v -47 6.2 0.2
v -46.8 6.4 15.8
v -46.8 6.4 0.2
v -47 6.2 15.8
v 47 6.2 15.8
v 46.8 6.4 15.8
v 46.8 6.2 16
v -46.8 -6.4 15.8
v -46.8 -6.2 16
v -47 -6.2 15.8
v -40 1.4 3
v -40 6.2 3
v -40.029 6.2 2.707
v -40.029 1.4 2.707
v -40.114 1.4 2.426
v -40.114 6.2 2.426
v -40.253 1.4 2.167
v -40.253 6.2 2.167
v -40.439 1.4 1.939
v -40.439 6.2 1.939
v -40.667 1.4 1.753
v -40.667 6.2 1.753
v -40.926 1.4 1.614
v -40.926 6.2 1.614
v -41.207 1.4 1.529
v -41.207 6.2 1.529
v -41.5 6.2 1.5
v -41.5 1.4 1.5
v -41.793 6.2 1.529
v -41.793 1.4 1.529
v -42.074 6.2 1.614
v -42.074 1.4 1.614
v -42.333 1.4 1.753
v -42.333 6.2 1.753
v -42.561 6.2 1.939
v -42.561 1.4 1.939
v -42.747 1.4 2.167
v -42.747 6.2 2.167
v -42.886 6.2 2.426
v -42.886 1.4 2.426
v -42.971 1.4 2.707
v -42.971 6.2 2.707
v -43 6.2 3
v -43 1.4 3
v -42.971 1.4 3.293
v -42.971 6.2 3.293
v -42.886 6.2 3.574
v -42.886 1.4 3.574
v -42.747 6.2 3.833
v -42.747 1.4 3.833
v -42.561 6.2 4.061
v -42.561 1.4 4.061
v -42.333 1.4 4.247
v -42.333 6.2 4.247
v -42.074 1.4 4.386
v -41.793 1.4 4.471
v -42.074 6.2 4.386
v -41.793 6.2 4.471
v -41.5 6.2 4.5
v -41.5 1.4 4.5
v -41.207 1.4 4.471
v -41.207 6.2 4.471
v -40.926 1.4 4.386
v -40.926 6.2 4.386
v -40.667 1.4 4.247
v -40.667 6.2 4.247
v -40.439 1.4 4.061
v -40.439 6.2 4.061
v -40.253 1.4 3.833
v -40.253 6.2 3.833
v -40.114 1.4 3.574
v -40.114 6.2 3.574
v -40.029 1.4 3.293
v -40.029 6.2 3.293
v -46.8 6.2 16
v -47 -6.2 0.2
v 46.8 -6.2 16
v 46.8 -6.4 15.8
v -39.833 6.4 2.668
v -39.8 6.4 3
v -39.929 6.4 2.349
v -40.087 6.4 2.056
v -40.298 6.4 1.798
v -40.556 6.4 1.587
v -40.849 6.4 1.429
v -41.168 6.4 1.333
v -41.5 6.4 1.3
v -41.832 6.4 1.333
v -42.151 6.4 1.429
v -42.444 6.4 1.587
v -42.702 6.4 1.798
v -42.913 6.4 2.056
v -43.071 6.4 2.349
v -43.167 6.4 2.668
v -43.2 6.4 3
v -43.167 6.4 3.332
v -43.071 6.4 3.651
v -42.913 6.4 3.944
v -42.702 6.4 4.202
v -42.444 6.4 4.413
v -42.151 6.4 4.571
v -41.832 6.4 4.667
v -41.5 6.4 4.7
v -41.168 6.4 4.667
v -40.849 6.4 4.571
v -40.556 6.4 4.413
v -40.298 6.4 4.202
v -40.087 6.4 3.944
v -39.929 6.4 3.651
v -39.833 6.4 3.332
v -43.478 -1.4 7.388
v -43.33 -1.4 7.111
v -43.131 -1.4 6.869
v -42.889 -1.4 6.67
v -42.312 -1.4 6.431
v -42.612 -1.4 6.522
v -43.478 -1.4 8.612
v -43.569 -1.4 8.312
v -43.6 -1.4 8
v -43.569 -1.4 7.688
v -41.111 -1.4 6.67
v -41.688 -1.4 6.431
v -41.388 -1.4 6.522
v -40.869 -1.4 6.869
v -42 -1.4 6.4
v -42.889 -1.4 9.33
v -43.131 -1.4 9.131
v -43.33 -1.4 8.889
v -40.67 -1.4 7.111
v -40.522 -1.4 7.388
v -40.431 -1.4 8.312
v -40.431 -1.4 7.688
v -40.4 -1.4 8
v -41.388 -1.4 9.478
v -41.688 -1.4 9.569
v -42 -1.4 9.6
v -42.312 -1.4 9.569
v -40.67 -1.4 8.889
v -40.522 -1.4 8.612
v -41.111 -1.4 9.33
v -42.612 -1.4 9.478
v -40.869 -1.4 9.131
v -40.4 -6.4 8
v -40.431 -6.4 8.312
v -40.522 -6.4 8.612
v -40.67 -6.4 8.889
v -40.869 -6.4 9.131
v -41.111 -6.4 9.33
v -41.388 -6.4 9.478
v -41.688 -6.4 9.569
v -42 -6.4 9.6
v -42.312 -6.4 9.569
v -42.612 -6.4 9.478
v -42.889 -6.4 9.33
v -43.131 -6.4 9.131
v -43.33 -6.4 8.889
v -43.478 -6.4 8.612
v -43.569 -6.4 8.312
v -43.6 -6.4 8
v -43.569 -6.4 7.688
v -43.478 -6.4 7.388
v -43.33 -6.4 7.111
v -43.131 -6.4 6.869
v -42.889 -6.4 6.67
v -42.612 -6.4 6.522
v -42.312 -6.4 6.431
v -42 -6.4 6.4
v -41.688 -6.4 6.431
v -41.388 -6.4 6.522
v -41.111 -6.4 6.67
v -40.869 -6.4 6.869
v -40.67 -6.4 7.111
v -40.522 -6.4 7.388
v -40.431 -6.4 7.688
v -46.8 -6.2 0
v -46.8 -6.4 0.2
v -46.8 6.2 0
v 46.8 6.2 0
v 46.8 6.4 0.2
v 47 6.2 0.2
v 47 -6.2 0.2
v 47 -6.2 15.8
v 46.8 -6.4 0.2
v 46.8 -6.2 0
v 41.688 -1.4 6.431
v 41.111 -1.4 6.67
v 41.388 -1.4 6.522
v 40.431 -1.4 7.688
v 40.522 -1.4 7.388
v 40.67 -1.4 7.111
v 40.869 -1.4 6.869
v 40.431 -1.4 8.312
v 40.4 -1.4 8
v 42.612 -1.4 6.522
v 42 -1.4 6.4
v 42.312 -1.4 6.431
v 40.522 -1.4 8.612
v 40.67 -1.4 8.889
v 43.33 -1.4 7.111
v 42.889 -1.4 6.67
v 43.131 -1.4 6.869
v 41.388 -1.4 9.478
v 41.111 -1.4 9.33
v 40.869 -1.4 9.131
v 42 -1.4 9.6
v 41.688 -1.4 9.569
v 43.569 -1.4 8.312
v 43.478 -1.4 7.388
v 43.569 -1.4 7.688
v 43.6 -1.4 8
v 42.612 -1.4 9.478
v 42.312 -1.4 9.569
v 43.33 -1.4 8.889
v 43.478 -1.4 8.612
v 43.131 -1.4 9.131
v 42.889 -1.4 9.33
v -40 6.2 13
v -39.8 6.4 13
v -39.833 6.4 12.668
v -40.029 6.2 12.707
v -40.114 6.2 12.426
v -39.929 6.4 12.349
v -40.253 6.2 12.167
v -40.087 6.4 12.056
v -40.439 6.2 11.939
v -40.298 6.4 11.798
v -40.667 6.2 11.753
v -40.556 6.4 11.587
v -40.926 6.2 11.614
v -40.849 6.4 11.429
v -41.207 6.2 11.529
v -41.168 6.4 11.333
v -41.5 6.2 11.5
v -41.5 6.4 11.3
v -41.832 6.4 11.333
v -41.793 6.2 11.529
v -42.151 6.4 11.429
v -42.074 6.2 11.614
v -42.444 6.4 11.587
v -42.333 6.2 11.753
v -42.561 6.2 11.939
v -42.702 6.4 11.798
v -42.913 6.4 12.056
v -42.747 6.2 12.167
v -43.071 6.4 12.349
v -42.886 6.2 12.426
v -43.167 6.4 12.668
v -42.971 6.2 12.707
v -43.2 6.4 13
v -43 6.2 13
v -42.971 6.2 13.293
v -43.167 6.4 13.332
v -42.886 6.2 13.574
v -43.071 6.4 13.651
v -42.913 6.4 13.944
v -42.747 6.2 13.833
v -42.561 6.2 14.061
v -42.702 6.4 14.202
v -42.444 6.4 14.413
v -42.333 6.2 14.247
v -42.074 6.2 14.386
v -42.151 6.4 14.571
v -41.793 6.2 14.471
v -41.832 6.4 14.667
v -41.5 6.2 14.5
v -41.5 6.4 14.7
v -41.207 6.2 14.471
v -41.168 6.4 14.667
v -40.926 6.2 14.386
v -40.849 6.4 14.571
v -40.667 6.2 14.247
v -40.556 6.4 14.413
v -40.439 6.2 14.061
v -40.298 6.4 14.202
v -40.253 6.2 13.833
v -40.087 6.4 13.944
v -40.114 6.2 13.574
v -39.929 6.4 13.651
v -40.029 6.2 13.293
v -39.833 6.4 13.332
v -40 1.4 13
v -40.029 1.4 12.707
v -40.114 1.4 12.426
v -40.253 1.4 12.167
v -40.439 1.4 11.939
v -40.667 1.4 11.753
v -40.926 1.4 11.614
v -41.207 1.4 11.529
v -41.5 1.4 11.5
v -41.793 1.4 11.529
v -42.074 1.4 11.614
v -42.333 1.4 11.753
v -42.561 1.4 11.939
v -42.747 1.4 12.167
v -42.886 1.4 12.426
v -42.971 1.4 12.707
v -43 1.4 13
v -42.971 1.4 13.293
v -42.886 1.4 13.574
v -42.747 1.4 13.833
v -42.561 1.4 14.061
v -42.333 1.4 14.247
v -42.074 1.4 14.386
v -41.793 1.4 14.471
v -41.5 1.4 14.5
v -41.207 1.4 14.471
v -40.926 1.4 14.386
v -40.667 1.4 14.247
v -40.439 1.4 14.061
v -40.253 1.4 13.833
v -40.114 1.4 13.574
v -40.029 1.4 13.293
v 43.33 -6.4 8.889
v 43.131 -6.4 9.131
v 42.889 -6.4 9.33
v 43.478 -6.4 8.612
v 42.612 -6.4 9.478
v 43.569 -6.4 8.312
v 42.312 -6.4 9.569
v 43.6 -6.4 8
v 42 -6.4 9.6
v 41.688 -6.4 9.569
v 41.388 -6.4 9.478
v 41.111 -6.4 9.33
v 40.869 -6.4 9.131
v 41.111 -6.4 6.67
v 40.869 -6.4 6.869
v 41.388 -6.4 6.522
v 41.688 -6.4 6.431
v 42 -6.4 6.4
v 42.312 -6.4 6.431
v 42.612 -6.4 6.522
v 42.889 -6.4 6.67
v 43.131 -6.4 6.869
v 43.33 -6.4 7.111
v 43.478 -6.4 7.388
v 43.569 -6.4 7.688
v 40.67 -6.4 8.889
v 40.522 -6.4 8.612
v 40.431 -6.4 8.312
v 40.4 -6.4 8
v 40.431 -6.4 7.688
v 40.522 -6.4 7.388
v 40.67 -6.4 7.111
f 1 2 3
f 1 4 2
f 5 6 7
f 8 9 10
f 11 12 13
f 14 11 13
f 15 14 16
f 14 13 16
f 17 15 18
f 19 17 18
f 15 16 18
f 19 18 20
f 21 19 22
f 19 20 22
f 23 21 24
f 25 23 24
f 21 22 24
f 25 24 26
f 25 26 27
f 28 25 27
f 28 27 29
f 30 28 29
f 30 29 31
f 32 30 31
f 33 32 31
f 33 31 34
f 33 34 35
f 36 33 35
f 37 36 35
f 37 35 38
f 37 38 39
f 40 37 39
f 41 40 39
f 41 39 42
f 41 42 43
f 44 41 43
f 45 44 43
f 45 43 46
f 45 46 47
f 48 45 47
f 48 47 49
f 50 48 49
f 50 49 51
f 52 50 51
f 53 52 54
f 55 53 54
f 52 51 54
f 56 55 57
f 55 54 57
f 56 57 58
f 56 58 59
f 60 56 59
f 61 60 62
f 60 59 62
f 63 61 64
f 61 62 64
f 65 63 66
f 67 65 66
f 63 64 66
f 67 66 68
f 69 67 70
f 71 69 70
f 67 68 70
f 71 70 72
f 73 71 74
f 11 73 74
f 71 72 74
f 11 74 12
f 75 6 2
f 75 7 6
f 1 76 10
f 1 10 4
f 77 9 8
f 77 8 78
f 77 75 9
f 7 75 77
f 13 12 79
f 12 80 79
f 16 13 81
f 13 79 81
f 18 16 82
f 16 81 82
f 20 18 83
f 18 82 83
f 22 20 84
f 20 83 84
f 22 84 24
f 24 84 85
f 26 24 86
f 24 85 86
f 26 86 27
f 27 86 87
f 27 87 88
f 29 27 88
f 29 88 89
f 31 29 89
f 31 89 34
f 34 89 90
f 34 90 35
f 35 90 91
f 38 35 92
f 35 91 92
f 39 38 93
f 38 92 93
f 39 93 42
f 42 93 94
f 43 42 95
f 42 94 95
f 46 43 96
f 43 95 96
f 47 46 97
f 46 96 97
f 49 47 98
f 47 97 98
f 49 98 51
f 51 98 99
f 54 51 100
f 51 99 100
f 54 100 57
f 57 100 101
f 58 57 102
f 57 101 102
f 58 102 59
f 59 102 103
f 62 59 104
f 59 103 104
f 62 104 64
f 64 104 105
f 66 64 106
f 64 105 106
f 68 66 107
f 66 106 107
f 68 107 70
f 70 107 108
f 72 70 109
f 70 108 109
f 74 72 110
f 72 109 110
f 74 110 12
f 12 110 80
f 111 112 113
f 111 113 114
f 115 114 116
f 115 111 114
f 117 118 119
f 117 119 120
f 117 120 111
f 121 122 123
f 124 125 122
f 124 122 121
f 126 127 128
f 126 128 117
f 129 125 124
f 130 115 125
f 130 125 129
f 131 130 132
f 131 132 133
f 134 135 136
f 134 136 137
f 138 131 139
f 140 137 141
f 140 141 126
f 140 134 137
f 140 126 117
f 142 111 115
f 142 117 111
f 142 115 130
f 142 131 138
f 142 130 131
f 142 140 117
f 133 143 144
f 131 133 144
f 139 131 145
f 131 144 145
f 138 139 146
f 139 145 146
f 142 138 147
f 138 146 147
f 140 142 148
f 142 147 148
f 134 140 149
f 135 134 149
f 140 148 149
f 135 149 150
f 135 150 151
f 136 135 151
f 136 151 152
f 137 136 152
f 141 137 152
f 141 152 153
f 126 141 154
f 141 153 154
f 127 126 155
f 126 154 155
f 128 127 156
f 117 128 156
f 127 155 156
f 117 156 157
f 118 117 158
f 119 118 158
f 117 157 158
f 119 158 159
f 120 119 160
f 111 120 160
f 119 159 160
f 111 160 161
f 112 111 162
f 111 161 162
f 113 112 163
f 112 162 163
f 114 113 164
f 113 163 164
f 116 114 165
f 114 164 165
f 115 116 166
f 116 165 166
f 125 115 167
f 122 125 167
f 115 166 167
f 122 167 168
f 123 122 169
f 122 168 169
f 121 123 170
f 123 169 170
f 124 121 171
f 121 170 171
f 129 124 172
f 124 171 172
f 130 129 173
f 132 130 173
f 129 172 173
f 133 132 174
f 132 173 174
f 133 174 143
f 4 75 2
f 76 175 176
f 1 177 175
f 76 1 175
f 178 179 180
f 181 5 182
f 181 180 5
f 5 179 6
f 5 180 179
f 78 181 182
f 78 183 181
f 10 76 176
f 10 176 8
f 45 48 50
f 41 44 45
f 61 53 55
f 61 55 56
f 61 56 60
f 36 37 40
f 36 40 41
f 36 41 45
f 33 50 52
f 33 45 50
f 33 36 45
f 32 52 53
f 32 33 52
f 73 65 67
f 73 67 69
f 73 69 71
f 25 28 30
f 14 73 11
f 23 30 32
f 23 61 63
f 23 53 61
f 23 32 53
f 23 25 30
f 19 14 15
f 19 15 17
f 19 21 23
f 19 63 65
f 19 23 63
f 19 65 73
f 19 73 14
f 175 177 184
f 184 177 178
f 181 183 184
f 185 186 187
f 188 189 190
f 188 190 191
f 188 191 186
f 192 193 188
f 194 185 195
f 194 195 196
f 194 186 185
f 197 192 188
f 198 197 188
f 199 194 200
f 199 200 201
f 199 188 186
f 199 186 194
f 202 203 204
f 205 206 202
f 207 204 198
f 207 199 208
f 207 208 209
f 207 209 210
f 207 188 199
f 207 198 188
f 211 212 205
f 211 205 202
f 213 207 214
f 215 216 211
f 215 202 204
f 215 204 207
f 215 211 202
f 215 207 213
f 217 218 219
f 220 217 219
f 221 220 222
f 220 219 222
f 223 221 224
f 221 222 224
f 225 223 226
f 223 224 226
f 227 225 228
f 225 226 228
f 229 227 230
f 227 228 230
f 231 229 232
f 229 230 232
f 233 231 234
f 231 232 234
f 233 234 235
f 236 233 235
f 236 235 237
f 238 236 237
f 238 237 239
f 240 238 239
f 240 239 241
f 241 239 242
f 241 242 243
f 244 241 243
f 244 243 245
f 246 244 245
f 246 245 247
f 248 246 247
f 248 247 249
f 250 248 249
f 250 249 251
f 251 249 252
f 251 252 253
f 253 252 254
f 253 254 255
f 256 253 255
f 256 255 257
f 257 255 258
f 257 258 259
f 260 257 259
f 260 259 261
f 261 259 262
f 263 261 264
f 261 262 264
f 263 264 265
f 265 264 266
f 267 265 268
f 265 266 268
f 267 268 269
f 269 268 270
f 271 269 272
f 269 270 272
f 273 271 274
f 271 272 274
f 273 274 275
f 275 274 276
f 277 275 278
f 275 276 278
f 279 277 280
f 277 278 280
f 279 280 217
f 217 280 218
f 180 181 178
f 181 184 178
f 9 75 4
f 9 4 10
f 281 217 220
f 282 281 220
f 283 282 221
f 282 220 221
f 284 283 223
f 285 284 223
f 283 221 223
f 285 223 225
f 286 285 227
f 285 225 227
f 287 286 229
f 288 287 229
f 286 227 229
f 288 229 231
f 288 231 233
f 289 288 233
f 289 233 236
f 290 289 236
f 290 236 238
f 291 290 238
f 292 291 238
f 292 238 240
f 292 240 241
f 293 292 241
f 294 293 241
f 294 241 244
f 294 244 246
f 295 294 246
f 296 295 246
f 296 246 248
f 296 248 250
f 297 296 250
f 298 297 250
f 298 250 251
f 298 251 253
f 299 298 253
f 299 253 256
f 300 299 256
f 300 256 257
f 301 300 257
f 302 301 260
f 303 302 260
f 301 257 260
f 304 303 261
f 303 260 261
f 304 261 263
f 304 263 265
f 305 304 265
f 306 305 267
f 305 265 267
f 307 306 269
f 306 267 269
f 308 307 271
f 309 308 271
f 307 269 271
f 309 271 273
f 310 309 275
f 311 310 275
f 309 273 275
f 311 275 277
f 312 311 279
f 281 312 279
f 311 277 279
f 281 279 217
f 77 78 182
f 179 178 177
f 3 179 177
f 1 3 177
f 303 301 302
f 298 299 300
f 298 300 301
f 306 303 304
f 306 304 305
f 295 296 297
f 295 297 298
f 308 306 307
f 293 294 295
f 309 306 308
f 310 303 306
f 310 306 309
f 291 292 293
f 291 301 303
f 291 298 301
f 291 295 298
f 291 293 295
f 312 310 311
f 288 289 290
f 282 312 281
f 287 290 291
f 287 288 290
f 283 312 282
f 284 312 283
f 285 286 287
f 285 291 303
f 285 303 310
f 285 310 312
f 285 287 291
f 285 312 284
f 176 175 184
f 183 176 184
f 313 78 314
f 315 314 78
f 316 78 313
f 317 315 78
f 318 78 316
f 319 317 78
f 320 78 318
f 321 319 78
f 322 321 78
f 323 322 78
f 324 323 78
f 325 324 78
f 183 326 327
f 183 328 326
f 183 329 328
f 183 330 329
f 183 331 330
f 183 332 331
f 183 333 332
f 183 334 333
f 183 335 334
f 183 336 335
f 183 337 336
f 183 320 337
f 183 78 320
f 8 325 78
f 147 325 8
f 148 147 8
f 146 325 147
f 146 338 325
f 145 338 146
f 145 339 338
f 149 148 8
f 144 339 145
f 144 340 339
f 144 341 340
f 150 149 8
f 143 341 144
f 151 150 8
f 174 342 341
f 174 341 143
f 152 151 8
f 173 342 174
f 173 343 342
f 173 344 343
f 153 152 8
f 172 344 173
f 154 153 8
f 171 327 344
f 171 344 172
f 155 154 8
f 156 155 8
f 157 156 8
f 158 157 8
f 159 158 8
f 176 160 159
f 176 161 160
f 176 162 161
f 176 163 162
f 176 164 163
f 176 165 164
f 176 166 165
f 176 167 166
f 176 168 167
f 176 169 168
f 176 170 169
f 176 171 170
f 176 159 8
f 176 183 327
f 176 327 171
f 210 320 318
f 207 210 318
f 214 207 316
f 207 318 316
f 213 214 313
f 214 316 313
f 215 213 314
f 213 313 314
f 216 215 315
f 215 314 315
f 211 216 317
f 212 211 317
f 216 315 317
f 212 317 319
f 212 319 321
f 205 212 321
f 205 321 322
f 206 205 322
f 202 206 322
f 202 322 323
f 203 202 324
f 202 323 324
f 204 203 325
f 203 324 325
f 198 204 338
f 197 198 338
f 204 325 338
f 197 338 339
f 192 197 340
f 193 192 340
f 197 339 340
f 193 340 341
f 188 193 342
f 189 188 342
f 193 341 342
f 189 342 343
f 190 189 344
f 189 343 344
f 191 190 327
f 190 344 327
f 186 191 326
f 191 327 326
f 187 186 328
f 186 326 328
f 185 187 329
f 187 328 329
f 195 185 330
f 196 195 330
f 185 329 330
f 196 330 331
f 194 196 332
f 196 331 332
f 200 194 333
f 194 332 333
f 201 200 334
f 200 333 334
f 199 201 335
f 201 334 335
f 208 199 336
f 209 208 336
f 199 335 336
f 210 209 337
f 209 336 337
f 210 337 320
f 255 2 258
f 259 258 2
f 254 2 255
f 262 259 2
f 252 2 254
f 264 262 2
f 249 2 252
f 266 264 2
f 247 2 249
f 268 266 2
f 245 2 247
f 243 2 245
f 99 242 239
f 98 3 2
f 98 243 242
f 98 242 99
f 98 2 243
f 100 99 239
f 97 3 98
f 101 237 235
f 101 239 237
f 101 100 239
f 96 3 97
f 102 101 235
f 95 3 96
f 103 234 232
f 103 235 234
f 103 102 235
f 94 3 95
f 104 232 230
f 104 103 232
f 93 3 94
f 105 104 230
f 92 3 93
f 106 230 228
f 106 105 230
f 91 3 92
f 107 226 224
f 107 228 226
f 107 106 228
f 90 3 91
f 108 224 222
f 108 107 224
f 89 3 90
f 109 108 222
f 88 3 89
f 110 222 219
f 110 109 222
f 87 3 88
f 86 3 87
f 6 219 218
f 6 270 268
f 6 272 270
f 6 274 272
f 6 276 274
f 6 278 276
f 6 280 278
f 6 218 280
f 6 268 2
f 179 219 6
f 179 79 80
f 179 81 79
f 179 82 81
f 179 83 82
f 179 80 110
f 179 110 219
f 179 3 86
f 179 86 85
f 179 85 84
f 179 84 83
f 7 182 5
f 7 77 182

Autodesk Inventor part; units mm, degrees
ref_plane "YZ Plane" through (0, 0, 0) normal (1, 0, 0) x (0, 1, 0)
ref_plane "XZ Plane" through (0, 0, 0) normal (0, 1, 0) x (-1, 0, 0)
ref_plane "XY Plane" through (0, 0, 0) normal (0, 0, 1) x (1, 0, 0)
sketch "Sketch1" plane through (0, 0, 0) normal (0, 0, 1) x (1, 0, 0)
  line L0 (-47, 6.4) -> (47, 6.4)
  line L1 (47, 6.4) -> (47, -6.4)
  line L2 (47, -6.4) -> (-47, -6.4)
  line L3 (-47, -6.4) -> (-47, 6.4)
  point P0 (0, 0)
  point P1 (-47, 0)
  point P2 (0, 6.4)
  dimension "d0" = 94
  dimension "d1" = 12.8
extrude "Extrusion1" add sketch "Sketch1" along normal blind 16
chamfer "Chamfer1" distance 0.2 angle 45 12 edges at (0, 6.4, 16) (-47, 0, 16) (-47, 6.4, 8) (0, 6.4, 0) (0, -6.4, 16) (0, -6.4, 0) (47, -6.4, 8) (47, 6.4, 8) (47, 0, 16) (47, 0, 0) (-47, 0, 0) (-47, -6.4, 8)
sketch "Sketch2" plane through (-46.8, 6.4, 0.2) normal (0, 1, 0) x (1, 0, 0)
  circle A0 centre (5.3, -2.8) radius 1.5
  circle A1 centre (5.3, -12.8) radius 1.5
  line L0 (0, -15.8) -> (93.6, -15.8) projected
  line L1 (93.6, 0.2) -> (0, 0.2) projected
  line L2 (-0.2, 0) -> (-0.2, -15.6) projected
  line L3 (7.8, 0.2) -> (7.8, -15.8)
  point P0 (46.8, 0.2)
  dimension "d7" = 3
  dimension "d8" = 10
  dimension "d9" = 16
  dimension "d10" = 3
  dimension "d11" = 5.5
  dimension "d12" = 8
extrude "Extrusion2" cut sketch "Sketch2" against normal blind 5
thread "Thread1" size "M3x0.5" class "6H" standard "ANSI Metric M Profile" full length
thread "Thread2" size "M3x0.5" class "6H" standard "ANSI Metric M Profile" full length
chamfer "Chamfer2" distance 0.2 angle 45 2 edges at (-43, 6.4, 13) (-43, 6.4, 3)
sketch "Sketch3" plane through (-46.8, -6.4, 15.8) normal (0, -1, 0) x (1, 0, 0)
  circle A0 centre (4.8, -7.8) radius 1.6
  circle A1 centre (88.8, -7.8) radius 1.6
  line L0 (0, -15.6) -> (0, 0) projected
  line L1 (93.6, 0) -> (93.6, -15.6) projected
  line L2 (-0.2, 0) -> (-0.2, -15.6) projected
  line L3 (93.8, -15.6) -> (93.8, 0) projected
  point P0 (46.8, -15.8)
  point P1 (0, -7.8)
  point P2 (93.6, -7.8)
  dimension "d22" = 3.2
  dimension "d23" = 5
  dimension "d24" = 5
extrude "Extrusion3" cut sketch "Sketch3" against normal blind 5
thread "Thread3" size "M3.5x0.6" class "6H" standard "ANSI Metric M Profile" full length
thread "Thread4" size "M3.5x0.6" class "6H" standard "ANSI Metric M Profile" full length
equation "\"d10\" = -0.5 * d8 + 0.5 * d9"
properties part number "Aluminum Mounting Bridge"
